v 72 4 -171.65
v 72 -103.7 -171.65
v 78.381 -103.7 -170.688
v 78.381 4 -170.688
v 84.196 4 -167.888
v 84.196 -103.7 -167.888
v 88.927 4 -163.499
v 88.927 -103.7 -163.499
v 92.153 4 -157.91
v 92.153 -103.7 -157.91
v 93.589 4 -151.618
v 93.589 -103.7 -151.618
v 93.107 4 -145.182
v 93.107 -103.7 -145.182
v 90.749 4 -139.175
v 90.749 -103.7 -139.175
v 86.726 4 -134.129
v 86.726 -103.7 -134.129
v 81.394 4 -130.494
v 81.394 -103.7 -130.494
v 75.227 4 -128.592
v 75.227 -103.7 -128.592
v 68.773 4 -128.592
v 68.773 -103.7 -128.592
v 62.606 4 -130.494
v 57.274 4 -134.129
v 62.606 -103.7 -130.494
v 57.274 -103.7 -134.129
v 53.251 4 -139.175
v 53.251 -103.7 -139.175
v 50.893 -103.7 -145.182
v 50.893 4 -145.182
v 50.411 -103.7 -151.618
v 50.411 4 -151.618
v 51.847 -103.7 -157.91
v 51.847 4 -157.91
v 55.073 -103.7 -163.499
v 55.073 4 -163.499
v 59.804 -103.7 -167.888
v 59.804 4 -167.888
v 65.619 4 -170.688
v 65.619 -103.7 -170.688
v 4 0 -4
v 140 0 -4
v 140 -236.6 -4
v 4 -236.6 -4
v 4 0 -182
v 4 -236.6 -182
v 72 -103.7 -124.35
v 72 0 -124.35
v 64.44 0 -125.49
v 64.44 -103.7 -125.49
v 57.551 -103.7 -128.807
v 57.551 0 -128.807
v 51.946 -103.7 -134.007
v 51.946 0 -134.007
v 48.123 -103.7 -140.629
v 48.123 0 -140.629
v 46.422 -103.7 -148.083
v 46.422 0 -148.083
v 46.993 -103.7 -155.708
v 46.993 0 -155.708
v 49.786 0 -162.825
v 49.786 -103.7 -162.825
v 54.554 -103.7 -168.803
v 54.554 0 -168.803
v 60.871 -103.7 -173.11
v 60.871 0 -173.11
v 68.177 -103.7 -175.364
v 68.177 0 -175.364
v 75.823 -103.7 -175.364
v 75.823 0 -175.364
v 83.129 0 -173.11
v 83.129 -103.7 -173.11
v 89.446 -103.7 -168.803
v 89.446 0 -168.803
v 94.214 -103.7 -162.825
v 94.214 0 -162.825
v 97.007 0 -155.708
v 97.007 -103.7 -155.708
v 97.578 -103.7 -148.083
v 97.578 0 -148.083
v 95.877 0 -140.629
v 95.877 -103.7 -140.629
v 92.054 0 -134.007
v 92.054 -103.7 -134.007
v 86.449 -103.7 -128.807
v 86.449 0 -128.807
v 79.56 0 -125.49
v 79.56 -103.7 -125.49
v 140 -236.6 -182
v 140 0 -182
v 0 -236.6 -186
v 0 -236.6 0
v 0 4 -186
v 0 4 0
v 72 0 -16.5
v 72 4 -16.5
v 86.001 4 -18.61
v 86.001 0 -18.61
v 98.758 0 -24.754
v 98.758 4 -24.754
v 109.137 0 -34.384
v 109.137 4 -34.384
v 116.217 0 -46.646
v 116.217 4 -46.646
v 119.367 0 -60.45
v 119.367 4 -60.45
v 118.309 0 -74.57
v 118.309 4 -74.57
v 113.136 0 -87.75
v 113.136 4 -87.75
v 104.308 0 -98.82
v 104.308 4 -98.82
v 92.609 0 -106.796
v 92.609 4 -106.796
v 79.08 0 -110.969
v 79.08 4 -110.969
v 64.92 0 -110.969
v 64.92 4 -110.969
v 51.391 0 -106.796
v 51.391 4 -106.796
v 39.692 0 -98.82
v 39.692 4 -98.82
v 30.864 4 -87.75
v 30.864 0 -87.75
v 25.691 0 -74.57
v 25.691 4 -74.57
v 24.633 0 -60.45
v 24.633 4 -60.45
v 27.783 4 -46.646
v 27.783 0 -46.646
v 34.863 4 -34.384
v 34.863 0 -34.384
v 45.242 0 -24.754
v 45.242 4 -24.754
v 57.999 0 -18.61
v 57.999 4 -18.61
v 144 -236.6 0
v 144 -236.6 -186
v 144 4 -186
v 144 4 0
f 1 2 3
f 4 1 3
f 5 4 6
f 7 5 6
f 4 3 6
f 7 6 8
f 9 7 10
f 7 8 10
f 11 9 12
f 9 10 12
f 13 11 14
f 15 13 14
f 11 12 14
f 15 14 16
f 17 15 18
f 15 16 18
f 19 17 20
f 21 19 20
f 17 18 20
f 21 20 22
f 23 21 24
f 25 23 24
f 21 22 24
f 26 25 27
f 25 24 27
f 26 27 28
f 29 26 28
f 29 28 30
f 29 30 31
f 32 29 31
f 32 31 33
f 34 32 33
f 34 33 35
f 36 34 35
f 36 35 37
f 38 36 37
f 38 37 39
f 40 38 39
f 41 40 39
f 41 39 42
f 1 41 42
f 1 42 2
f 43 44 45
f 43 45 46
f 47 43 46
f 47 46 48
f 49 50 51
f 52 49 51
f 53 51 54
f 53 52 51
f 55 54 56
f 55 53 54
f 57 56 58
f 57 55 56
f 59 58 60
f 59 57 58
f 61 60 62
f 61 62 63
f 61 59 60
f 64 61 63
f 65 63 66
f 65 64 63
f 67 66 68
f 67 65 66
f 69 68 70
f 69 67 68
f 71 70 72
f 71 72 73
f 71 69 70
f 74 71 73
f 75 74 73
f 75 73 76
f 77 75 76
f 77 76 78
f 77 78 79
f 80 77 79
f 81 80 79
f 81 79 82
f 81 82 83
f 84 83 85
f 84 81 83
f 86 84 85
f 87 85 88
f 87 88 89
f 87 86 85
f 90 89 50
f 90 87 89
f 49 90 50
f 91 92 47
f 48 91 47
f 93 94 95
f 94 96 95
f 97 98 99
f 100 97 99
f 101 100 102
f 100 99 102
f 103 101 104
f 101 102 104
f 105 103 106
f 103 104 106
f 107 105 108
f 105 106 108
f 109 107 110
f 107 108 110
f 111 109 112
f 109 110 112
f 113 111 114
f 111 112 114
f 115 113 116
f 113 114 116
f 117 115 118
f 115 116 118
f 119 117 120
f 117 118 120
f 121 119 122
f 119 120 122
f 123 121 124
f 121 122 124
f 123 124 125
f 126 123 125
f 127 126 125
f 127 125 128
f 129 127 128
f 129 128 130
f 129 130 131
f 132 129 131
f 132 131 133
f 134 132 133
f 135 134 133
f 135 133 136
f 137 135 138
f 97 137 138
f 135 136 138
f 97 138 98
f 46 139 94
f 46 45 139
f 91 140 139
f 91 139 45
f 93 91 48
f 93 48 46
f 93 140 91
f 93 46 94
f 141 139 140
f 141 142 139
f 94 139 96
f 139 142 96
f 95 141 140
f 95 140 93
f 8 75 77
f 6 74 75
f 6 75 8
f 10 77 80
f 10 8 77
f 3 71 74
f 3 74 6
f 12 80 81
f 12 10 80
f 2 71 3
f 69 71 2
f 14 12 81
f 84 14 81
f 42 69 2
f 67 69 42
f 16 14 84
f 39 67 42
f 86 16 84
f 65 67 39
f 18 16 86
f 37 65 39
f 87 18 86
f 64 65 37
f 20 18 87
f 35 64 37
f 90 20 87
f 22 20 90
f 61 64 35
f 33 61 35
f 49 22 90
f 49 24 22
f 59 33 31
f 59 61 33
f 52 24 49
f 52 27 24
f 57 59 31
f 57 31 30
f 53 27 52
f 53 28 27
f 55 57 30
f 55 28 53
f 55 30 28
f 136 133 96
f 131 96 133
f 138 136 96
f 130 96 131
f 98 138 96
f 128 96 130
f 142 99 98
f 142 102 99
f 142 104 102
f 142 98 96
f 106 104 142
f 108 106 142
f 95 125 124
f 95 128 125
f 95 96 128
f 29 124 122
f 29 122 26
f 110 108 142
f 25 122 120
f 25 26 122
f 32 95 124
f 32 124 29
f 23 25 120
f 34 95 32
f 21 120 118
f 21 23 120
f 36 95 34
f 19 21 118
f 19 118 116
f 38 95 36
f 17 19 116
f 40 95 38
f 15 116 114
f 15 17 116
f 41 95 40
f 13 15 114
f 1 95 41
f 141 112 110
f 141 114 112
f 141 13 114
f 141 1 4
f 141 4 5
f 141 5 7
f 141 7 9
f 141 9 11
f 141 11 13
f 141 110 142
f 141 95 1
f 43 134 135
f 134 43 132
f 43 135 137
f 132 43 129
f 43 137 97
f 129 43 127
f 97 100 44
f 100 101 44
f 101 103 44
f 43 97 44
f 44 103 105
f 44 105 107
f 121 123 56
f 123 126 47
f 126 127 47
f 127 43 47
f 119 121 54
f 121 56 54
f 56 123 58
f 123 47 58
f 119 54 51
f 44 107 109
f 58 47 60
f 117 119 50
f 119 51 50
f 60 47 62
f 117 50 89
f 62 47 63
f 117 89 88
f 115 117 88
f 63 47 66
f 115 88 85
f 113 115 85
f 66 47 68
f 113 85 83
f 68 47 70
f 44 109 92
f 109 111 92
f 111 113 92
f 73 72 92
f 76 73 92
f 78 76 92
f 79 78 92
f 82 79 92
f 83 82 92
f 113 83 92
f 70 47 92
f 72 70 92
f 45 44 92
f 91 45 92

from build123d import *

# Parameters (mm, degrees)
SKETCH2_W           = 144
SKETCH2_H           = 186
BOSS_EXTRUDE1_DEPTH = 4
SKETCH3_W           = 144
SKETCH3_H           = 186
SKETCH3_W_2         = 136
SKETCH3_H_2         = 178
BOSS_EXTRUDE2_DEPTH = 236.6
SKETCH4_R           = 47.5
CUT_EXTRUDE1_DEPTH  = 4
SKETCH5_R           = 21.65
CUT_EXTRUDE2_DEPTH  = 4
BOSS_EXTRUDE3_START = 103.7
SKETCH6_R           = 25.65
SKETCH6_R_2         = 21.65
BOSS_EXTRUDE3_DEPTH = 103.7


with BuildPart() as part:
    # Sketch2 → Boss-Extrude1 (new body)
    with BuildSketch(Plane(origin=(0, 0, 0), x_dir=(1, 0, 0), z_dir=(0, 1, 0))):
        with Locations((72, 93)):
            Rectangle(SKETCH2_W, SKETCH2_H)
    extrude(amount=BOSS_EXTRUDE1_DEPTH)

    # Sketch3 → Boss-Extrude2 (add)
    with BuildSketch(Plane(origin=(0, 0, 0), x_dir=(-1, 0, 0), z_dir=(0, -1, 0))):
        with Locations((-72, 93)):
            Rectangle(SKETCH3_W, SKETCH3_H)
        with Locations((-72, 93)):
            Rectangle(SKETCH3_W_2, SKETCH3_H_2, mode=Mode.SUBTRACT)
    extrude(amount=BOSS_EXTRUDE2_DEPTH)

    # Sketch4 → Cut-Extrude1 (cut)
    with BuildSketch(Plane(origin=(0, 4, 0), x_dir=(1, 0, 0), z_dir=(0, 1, 0))):
        with Locations(Location((72, 64, 0), (0, 0, 270))):
            Circle(SKETCH4_R)
    extrude(amount=-CUT_EXTRUDE1_DEPTH, mode=Mode.SUBTRACT)

    # Sketch5 → Cut-Extrude2 (cut)
    with BuildSketch(Plane(origin=(0, 0, 0), x_dir=(-1, 0, 0), z_dir=(0, -1, 0))):
        with Locations(Location((-72, 150, 0), (0, 0, 90))):
            Circle(SKETCH5_R)
    extrude(amount=-CUT_EXTRUDE2_DEPTH, mode=Mode.SUBTRACT)

    # Sketch6 → Boss-Extrude3 (add)
    with BuildSketch(Plane(origin=(0, 0, 0), x_dir=(-1, 0, 0), z_dir=(0, -1, 0)).offset(BOSS_EXTRUDE3_START)):
        with Locations(Location((-72, 150, 0), (0, 0, 270))):
            Circle(SKETCH6_R)
        with Locations(Location((-72, 150, 0), (0, 0, 90))):
            Circle(SKETCH6_R_2, mode=Mode.SUBTRACT)
    extrude(amount=-BOSS_EXTRUDE3_DEPTH)


solid = part.part
